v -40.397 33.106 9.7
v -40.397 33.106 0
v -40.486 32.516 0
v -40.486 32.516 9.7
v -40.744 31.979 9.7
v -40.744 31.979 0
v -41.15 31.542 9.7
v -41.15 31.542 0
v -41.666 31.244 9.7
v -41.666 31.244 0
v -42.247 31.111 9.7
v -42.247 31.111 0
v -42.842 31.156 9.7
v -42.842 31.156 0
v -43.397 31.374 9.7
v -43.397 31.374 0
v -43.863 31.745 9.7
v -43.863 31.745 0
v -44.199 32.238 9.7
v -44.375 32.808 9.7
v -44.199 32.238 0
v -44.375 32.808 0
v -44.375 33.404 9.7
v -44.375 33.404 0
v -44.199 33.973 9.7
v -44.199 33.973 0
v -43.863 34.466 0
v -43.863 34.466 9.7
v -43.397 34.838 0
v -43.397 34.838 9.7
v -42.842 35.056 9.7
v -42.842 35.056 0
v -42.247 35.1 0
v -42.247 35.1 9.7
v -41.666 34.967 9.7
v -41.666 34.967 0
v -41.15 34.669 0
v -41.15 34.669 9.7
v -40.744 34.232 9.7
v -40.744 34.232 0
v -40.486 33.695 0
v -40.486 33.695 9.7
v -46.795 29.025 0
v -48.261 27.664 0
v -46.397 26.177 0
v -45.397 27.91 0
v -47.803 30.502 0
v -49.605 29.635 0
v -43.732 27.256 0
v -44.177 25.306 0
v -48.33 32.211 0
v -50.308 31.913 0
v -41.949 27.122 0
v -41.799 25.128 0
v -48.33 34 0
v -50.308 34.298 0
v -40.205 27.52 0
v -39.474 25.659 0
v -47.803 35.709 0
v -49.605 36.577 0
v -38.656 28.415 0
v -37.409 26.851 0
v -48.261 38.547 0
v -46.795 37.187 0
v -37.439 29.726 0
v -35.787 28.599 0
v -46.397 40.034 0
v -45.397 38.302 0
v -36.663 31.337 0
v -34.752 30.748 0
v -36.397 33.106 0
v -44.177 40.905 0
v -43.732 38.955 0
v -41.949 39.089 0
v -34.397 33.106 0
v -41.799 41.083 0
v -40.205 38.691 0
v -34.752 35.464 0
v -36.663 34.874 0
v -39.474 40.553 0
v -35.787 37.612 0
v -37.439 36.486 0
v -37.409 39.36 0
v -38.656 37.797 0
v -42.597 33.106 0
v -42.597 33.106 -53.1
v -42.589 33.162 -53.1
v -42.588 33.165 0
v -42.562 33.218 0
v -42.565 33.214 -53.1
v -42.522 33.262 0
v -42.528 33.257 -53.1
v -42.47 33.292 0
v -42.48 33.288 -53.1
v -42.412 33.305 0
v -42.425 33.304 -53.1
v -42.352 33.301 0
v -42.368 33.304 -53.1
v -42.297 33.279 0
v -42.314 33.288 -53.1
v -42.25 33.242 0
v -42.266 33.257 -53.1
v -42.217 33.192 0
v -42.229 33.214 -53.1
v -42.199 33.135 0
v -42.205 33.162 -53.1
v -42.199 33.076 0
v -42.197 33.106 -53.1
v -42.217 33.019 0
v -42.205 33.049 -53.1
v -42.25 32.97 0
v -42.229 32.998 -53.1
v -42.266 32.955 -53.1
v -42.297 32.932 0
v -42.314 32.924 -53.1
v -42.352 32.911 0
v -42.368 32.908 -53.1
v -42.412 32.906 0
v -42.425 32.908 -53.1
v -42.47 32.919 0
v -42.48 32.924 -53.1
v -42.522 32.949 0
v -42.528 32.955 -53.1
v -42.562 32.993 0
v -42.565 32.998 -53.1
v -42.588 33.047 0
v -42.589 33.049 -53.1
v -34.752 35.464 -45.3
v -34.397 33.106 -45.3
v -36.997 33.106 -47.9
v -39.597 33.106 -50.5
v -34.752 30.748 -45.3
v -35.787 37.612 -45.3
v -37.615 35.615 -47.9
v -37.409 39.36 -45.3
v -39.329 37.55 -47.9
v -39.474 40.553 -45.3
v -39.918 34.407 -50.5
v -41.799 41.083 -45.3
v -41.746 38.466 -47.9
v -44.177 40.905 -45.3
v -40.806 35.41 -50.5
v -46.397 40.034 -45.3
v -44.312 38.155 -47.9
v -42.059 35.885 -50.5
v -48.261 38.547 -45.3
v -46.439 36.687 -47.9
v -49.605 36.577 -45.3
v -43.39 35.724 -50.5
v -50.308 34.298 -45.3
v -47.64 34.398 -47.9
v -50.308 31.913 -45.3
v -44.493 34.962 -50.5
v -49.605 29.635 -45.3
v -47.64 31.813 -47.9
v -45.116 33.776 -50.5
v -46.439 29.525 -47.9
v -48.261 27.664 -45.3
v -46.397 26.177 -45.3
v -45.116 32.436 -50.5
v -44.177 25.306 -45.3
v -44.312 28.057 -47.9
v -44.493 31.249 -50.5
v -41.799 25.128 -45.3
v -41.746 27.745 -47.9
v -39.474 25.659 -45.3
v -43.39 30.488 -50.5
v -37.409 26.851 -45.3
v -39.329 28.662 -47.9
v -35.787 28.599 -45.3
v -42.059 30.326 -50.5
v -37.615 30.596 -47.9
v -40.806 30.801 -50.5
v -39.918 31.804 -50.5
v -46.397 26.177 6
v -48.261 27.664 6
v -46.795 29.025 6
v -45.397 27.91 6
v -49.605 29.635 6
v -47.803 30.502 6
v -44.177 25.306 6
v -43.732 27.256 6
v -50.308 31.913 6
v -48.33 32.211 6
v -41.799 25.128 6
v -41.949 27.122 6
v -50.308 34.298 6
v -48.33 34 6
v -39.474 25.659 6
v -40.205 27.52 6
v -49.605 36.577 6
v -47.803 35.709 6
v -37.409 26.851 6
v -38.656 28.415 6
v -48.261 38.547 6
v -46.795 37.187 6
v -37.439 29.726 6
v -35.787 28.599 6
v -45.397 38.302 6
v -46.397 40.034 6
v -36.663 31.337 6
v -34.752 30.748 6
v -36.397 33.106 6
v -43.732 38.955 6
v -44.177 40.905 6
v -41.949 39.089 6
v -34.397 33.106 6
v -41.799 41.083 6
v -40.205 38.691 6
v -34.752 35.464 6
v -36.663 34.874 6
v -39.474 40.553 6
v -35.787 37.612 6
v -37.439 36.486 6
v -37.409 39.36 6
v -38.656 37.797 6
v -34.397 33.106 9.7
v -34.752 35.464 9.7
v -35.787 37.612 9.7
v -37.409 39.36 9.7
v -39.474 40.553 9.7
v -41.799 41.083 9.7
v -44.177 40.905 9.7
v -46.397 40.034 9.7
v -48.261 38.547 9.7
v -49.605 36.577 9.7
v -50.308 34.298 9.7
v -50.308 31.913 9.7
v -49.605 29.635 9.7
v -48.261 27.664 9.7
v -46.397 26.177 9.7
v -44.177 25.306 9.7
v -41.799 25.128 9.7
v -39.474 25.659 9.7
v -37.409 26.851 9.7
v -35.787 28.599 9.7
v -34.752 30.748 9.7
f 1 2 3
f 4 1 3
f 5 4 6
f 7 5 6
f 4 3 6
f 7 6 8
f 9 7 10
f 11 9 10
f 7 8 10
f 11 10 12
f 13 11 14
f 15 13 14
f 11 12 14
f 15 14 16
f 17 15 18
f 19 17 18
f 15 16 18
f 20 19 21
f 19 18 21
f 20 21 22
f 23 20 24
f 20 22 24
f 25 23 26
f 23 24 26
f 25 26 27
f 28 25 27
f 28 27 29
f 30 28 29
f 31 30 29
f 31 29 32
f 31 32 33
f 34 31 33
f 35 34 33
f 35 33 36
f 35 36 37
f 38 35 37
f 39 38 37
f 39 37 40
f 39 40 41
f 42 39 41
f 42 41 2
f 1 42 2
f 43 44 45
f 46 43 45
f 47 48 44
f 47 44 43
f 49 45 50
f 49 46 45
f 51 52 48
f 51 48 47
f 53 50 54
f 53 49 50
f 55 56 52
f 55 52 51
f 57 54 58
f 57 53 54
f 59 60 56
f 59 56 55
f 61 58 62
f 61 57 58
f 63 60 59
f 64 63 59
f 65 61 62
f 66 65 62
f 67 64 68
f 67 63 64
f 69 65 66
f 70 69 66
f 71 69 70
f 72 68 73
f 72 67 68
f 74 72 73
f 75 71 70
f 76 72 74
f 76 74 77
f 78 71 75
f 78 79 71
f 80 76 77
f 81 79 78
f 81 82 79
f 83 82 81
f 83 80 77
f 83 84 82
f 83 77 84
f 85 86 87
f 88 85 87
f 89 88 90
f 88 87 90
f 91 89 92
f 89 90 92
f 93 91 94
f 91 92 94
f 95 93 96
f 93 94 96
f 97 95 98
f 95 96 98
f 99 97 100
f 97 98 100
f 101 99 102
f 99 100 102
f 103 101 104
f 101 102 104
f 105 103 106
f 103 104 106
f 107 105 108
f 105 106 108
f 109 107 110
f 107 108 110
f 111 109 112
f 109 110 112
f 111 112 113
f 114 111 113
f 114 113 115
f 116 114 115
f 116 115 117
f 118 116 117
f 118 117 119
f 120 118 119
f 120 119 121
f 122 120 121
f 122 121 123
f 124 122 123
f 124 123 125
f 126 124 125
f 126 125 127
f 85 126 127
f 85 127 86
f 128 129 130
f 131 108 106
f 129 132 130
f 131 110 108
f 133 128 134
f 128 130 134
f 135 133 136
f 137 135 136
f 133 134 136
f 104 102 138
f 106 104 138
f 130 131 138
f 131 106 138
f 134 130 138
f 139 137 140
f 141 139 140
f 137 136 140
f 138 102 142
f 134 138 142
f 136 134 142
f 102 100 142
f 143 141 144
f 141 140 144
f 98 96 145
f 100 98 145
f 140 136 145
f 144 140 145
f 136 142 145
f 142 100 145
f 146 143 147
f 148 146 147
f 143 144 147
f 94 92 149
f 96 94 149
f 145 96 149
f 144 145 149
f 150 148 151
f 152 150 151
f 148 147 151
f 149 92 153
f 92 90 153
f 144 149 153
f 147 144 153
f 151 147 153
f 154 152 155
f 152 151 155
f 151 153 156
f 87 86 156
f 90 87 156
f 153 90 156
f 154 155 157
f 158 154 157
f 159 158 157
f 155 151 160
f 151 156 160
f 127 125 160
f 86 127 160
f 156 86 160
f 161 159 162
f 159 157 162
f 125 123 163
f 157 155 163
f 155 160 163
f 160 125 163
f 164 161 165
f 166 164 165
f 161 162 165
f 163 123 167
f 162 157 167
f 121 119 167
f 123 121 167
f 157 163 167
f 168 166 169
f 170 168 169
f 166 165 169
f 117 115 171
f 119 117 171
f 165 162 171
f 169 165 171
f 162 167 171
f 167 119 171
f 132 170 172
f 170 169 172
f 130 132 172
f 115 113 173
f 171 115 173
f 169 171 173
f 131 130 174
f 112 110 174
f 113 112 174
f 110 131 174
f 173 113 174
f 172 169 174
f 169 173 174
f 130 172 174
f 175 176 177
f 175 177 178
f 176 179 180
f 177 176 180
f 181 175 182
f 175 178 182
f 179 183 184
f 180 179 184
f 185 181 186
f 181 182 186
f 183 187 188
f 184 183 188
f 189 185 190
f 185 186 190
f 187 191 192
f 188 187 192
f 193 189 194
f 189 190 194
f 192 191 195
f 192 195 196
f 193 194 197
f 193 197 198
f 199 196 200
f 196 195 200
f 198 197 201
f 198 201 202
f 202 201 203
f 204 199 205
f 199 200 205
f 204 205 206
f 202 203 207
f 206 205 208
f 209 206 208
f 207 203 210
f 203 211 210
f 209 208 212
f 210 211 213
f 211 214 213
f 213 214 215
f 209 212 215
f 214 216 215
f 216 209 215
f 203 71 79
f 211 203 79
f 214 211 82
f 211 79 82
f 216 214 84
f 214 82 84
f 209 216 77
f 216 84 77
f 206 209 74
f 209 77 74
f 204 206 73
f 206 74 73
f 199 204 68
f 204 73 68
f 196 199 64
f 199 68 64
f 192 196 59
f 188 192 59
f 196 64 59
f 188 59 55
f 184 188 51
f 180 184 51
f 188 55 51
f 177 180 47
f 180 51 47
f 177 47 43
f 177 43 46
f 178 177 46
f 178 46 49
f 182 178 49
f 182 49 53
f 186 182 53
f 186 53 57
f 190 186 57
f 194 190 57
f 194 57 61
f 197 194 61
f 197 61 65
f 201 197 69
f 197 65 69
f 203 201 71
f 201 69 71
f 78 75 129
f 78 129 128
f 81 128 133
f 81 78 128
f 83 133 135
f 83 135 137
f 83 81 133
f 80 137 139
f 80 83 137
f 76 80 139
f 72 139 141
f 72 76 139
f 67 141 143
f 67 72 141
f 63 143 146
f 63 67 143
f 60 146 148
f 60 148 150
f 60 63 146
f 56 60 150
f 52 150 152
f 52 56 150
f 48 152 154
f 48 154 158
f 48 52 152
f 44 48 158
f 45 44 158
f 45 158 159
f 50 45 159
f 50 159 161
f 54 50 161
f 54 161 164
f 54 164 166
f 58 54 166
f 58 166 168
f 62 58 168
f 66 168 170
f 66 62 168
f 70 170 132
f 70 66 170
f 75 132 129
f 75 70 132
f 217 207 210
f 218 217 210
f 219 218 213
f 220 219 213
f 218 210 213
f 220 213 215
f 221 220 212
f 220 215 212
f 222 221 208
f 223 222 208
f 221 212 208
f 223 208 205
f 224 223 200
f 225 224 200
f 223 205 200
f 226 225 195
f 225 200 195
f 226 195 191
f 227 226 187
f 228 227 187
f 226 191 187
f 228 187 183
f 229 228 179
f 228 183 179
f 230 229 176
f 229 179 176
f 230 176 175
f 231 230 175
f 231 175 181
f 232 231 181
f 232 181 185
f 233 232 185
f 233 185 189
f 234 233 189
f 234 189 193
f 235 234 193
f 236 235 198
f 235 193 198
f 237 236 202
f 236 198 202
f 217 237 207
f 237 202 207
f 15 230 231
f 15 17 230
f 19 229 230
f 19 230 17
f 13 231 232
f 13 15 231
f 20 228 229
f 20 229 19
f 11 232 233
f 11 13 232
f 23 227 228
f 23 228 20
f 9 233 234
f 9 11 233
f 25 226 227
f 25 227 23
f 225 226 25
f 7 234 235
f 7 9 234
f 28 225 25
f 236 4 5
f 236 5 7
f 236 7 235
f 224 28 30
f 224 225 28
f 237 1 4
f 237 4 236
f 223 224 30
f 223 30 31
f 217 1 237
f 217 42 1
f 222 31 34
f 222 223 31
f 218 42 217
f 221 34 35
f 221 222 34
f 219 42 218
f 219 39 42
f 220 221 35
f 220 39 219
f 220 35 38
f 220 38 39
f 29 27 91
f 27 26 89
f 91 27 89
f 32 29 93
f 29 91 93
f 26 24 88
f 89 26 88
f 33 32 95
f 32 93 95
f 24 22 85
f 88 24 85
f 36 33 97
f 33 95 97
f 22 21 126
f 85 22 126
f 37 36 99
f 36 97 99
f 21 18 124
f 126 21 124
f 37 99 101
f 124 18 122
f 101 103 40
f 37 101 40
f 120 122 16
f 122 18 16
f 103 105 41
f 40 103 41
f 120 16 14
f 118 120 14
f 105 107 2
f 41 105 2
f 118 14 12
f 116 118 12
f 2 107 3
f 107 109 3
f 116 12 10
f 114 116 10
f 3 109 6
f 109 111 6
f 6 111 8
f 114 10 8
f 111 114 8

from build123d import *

# Parameters (mm, degrees)
F0_R     = 8
F0_R_2   = 6
F1_DEPTH = 53.3
F2_DEPTH = 6
F3_START = 6
F3_DEPTH = 3.7
F4_SIZE  = 8
F5_D     = 4
F5_DEPTH = 20
F5_TIP   = 1.2017212381
F6_D     = 0.4
F6_DEPTH = 70
F6_TIP   = 0.1201721238


with BuildPart() as f1:
    # F0 (on Top) → F1 (new body)
    with BuildSketch(Plane.XY):
        with Locations((-42.3969104886, 33.1056714058)):
            Circle(F0_R)
        with Locations((-42.3969104886, 33.1056714058)):
            Circle(F0_R_2, mode=Mode.SUBTRACT)
        with Locations((-42.3969104886, 33.1056714058)):
            Circle(F0_R_2)
    extrude(amount=-F1_DEPTH)

    # F0 (on Top) → F2 (join)
    with BuildSketch(Plane.XY):
        with Locations((-42.3969104886, 33.1056714058)):
            Circle(F0_R_2)
    extrude(amount=F2_DEPTH)

    # F0 (on Top) → F3 (join)
    with BuildSketch(Plane.XY.offset(F3_START)):
        with Locations((-42.3969104886, 33.1056714058)):
            Circle(F0_R)
        with Locations((-42.3969104886, 33.1056714058)):
            Circle(F0_R_2, mode=Mode.SUBTRACT)
        with Locations((-42.3969104886, 33.1056714058)):
            Circle(F0_R_2)
    extrude(amount=F3_DEPTH)

    # F4
    f4_edges = [f1.edges().sort_by_distance(p)[0] for p in [
        (-50.39691, 33.105671, -53.3),
    ]]
    chamfer(f4_edges, length=F4_SIZE)

    # F5 (one way)
    with BuildSketch(Plane(origin=(0, 0, 0), x_dir=(1, 0, 0), z_dir=(0, 0, -1))):
        with Locations((-42.3969104886, -33.1056714058)):
            Circle(F5_D / 2)
    extrude(amount=-F5_DEPTH, mode=Mode.SUBTRACT)
    with Locations(Plane(origin=(0, 0, 0), x_dir=(1, 0, 0), z_dir=(0, 0, -1))):
        with Locations((-42.3969104886, -33.1056714058)):
            with Locations((0, 0, -(F5_DEPTH + F5_TIP / 2))):  # 118° drill point
                Cone(0, F5_D / 2, F5_TIP, mode=Mode.SUBTRACT)

    # F6
    with Locations(Plane.XY):
        with Locations((-42.3969104886, 33.1056714058)):
            Hole(F6_D / 2, depth=F6_DEPTH)
            with Locations((0, 0, -(F6_DEPTH + F6_TIP / 2))):  # 118° drill point
                Cone(0, F6_D / 2, F6_TIP, mode=Mode.SUBTRACT)


solid = f1.part
